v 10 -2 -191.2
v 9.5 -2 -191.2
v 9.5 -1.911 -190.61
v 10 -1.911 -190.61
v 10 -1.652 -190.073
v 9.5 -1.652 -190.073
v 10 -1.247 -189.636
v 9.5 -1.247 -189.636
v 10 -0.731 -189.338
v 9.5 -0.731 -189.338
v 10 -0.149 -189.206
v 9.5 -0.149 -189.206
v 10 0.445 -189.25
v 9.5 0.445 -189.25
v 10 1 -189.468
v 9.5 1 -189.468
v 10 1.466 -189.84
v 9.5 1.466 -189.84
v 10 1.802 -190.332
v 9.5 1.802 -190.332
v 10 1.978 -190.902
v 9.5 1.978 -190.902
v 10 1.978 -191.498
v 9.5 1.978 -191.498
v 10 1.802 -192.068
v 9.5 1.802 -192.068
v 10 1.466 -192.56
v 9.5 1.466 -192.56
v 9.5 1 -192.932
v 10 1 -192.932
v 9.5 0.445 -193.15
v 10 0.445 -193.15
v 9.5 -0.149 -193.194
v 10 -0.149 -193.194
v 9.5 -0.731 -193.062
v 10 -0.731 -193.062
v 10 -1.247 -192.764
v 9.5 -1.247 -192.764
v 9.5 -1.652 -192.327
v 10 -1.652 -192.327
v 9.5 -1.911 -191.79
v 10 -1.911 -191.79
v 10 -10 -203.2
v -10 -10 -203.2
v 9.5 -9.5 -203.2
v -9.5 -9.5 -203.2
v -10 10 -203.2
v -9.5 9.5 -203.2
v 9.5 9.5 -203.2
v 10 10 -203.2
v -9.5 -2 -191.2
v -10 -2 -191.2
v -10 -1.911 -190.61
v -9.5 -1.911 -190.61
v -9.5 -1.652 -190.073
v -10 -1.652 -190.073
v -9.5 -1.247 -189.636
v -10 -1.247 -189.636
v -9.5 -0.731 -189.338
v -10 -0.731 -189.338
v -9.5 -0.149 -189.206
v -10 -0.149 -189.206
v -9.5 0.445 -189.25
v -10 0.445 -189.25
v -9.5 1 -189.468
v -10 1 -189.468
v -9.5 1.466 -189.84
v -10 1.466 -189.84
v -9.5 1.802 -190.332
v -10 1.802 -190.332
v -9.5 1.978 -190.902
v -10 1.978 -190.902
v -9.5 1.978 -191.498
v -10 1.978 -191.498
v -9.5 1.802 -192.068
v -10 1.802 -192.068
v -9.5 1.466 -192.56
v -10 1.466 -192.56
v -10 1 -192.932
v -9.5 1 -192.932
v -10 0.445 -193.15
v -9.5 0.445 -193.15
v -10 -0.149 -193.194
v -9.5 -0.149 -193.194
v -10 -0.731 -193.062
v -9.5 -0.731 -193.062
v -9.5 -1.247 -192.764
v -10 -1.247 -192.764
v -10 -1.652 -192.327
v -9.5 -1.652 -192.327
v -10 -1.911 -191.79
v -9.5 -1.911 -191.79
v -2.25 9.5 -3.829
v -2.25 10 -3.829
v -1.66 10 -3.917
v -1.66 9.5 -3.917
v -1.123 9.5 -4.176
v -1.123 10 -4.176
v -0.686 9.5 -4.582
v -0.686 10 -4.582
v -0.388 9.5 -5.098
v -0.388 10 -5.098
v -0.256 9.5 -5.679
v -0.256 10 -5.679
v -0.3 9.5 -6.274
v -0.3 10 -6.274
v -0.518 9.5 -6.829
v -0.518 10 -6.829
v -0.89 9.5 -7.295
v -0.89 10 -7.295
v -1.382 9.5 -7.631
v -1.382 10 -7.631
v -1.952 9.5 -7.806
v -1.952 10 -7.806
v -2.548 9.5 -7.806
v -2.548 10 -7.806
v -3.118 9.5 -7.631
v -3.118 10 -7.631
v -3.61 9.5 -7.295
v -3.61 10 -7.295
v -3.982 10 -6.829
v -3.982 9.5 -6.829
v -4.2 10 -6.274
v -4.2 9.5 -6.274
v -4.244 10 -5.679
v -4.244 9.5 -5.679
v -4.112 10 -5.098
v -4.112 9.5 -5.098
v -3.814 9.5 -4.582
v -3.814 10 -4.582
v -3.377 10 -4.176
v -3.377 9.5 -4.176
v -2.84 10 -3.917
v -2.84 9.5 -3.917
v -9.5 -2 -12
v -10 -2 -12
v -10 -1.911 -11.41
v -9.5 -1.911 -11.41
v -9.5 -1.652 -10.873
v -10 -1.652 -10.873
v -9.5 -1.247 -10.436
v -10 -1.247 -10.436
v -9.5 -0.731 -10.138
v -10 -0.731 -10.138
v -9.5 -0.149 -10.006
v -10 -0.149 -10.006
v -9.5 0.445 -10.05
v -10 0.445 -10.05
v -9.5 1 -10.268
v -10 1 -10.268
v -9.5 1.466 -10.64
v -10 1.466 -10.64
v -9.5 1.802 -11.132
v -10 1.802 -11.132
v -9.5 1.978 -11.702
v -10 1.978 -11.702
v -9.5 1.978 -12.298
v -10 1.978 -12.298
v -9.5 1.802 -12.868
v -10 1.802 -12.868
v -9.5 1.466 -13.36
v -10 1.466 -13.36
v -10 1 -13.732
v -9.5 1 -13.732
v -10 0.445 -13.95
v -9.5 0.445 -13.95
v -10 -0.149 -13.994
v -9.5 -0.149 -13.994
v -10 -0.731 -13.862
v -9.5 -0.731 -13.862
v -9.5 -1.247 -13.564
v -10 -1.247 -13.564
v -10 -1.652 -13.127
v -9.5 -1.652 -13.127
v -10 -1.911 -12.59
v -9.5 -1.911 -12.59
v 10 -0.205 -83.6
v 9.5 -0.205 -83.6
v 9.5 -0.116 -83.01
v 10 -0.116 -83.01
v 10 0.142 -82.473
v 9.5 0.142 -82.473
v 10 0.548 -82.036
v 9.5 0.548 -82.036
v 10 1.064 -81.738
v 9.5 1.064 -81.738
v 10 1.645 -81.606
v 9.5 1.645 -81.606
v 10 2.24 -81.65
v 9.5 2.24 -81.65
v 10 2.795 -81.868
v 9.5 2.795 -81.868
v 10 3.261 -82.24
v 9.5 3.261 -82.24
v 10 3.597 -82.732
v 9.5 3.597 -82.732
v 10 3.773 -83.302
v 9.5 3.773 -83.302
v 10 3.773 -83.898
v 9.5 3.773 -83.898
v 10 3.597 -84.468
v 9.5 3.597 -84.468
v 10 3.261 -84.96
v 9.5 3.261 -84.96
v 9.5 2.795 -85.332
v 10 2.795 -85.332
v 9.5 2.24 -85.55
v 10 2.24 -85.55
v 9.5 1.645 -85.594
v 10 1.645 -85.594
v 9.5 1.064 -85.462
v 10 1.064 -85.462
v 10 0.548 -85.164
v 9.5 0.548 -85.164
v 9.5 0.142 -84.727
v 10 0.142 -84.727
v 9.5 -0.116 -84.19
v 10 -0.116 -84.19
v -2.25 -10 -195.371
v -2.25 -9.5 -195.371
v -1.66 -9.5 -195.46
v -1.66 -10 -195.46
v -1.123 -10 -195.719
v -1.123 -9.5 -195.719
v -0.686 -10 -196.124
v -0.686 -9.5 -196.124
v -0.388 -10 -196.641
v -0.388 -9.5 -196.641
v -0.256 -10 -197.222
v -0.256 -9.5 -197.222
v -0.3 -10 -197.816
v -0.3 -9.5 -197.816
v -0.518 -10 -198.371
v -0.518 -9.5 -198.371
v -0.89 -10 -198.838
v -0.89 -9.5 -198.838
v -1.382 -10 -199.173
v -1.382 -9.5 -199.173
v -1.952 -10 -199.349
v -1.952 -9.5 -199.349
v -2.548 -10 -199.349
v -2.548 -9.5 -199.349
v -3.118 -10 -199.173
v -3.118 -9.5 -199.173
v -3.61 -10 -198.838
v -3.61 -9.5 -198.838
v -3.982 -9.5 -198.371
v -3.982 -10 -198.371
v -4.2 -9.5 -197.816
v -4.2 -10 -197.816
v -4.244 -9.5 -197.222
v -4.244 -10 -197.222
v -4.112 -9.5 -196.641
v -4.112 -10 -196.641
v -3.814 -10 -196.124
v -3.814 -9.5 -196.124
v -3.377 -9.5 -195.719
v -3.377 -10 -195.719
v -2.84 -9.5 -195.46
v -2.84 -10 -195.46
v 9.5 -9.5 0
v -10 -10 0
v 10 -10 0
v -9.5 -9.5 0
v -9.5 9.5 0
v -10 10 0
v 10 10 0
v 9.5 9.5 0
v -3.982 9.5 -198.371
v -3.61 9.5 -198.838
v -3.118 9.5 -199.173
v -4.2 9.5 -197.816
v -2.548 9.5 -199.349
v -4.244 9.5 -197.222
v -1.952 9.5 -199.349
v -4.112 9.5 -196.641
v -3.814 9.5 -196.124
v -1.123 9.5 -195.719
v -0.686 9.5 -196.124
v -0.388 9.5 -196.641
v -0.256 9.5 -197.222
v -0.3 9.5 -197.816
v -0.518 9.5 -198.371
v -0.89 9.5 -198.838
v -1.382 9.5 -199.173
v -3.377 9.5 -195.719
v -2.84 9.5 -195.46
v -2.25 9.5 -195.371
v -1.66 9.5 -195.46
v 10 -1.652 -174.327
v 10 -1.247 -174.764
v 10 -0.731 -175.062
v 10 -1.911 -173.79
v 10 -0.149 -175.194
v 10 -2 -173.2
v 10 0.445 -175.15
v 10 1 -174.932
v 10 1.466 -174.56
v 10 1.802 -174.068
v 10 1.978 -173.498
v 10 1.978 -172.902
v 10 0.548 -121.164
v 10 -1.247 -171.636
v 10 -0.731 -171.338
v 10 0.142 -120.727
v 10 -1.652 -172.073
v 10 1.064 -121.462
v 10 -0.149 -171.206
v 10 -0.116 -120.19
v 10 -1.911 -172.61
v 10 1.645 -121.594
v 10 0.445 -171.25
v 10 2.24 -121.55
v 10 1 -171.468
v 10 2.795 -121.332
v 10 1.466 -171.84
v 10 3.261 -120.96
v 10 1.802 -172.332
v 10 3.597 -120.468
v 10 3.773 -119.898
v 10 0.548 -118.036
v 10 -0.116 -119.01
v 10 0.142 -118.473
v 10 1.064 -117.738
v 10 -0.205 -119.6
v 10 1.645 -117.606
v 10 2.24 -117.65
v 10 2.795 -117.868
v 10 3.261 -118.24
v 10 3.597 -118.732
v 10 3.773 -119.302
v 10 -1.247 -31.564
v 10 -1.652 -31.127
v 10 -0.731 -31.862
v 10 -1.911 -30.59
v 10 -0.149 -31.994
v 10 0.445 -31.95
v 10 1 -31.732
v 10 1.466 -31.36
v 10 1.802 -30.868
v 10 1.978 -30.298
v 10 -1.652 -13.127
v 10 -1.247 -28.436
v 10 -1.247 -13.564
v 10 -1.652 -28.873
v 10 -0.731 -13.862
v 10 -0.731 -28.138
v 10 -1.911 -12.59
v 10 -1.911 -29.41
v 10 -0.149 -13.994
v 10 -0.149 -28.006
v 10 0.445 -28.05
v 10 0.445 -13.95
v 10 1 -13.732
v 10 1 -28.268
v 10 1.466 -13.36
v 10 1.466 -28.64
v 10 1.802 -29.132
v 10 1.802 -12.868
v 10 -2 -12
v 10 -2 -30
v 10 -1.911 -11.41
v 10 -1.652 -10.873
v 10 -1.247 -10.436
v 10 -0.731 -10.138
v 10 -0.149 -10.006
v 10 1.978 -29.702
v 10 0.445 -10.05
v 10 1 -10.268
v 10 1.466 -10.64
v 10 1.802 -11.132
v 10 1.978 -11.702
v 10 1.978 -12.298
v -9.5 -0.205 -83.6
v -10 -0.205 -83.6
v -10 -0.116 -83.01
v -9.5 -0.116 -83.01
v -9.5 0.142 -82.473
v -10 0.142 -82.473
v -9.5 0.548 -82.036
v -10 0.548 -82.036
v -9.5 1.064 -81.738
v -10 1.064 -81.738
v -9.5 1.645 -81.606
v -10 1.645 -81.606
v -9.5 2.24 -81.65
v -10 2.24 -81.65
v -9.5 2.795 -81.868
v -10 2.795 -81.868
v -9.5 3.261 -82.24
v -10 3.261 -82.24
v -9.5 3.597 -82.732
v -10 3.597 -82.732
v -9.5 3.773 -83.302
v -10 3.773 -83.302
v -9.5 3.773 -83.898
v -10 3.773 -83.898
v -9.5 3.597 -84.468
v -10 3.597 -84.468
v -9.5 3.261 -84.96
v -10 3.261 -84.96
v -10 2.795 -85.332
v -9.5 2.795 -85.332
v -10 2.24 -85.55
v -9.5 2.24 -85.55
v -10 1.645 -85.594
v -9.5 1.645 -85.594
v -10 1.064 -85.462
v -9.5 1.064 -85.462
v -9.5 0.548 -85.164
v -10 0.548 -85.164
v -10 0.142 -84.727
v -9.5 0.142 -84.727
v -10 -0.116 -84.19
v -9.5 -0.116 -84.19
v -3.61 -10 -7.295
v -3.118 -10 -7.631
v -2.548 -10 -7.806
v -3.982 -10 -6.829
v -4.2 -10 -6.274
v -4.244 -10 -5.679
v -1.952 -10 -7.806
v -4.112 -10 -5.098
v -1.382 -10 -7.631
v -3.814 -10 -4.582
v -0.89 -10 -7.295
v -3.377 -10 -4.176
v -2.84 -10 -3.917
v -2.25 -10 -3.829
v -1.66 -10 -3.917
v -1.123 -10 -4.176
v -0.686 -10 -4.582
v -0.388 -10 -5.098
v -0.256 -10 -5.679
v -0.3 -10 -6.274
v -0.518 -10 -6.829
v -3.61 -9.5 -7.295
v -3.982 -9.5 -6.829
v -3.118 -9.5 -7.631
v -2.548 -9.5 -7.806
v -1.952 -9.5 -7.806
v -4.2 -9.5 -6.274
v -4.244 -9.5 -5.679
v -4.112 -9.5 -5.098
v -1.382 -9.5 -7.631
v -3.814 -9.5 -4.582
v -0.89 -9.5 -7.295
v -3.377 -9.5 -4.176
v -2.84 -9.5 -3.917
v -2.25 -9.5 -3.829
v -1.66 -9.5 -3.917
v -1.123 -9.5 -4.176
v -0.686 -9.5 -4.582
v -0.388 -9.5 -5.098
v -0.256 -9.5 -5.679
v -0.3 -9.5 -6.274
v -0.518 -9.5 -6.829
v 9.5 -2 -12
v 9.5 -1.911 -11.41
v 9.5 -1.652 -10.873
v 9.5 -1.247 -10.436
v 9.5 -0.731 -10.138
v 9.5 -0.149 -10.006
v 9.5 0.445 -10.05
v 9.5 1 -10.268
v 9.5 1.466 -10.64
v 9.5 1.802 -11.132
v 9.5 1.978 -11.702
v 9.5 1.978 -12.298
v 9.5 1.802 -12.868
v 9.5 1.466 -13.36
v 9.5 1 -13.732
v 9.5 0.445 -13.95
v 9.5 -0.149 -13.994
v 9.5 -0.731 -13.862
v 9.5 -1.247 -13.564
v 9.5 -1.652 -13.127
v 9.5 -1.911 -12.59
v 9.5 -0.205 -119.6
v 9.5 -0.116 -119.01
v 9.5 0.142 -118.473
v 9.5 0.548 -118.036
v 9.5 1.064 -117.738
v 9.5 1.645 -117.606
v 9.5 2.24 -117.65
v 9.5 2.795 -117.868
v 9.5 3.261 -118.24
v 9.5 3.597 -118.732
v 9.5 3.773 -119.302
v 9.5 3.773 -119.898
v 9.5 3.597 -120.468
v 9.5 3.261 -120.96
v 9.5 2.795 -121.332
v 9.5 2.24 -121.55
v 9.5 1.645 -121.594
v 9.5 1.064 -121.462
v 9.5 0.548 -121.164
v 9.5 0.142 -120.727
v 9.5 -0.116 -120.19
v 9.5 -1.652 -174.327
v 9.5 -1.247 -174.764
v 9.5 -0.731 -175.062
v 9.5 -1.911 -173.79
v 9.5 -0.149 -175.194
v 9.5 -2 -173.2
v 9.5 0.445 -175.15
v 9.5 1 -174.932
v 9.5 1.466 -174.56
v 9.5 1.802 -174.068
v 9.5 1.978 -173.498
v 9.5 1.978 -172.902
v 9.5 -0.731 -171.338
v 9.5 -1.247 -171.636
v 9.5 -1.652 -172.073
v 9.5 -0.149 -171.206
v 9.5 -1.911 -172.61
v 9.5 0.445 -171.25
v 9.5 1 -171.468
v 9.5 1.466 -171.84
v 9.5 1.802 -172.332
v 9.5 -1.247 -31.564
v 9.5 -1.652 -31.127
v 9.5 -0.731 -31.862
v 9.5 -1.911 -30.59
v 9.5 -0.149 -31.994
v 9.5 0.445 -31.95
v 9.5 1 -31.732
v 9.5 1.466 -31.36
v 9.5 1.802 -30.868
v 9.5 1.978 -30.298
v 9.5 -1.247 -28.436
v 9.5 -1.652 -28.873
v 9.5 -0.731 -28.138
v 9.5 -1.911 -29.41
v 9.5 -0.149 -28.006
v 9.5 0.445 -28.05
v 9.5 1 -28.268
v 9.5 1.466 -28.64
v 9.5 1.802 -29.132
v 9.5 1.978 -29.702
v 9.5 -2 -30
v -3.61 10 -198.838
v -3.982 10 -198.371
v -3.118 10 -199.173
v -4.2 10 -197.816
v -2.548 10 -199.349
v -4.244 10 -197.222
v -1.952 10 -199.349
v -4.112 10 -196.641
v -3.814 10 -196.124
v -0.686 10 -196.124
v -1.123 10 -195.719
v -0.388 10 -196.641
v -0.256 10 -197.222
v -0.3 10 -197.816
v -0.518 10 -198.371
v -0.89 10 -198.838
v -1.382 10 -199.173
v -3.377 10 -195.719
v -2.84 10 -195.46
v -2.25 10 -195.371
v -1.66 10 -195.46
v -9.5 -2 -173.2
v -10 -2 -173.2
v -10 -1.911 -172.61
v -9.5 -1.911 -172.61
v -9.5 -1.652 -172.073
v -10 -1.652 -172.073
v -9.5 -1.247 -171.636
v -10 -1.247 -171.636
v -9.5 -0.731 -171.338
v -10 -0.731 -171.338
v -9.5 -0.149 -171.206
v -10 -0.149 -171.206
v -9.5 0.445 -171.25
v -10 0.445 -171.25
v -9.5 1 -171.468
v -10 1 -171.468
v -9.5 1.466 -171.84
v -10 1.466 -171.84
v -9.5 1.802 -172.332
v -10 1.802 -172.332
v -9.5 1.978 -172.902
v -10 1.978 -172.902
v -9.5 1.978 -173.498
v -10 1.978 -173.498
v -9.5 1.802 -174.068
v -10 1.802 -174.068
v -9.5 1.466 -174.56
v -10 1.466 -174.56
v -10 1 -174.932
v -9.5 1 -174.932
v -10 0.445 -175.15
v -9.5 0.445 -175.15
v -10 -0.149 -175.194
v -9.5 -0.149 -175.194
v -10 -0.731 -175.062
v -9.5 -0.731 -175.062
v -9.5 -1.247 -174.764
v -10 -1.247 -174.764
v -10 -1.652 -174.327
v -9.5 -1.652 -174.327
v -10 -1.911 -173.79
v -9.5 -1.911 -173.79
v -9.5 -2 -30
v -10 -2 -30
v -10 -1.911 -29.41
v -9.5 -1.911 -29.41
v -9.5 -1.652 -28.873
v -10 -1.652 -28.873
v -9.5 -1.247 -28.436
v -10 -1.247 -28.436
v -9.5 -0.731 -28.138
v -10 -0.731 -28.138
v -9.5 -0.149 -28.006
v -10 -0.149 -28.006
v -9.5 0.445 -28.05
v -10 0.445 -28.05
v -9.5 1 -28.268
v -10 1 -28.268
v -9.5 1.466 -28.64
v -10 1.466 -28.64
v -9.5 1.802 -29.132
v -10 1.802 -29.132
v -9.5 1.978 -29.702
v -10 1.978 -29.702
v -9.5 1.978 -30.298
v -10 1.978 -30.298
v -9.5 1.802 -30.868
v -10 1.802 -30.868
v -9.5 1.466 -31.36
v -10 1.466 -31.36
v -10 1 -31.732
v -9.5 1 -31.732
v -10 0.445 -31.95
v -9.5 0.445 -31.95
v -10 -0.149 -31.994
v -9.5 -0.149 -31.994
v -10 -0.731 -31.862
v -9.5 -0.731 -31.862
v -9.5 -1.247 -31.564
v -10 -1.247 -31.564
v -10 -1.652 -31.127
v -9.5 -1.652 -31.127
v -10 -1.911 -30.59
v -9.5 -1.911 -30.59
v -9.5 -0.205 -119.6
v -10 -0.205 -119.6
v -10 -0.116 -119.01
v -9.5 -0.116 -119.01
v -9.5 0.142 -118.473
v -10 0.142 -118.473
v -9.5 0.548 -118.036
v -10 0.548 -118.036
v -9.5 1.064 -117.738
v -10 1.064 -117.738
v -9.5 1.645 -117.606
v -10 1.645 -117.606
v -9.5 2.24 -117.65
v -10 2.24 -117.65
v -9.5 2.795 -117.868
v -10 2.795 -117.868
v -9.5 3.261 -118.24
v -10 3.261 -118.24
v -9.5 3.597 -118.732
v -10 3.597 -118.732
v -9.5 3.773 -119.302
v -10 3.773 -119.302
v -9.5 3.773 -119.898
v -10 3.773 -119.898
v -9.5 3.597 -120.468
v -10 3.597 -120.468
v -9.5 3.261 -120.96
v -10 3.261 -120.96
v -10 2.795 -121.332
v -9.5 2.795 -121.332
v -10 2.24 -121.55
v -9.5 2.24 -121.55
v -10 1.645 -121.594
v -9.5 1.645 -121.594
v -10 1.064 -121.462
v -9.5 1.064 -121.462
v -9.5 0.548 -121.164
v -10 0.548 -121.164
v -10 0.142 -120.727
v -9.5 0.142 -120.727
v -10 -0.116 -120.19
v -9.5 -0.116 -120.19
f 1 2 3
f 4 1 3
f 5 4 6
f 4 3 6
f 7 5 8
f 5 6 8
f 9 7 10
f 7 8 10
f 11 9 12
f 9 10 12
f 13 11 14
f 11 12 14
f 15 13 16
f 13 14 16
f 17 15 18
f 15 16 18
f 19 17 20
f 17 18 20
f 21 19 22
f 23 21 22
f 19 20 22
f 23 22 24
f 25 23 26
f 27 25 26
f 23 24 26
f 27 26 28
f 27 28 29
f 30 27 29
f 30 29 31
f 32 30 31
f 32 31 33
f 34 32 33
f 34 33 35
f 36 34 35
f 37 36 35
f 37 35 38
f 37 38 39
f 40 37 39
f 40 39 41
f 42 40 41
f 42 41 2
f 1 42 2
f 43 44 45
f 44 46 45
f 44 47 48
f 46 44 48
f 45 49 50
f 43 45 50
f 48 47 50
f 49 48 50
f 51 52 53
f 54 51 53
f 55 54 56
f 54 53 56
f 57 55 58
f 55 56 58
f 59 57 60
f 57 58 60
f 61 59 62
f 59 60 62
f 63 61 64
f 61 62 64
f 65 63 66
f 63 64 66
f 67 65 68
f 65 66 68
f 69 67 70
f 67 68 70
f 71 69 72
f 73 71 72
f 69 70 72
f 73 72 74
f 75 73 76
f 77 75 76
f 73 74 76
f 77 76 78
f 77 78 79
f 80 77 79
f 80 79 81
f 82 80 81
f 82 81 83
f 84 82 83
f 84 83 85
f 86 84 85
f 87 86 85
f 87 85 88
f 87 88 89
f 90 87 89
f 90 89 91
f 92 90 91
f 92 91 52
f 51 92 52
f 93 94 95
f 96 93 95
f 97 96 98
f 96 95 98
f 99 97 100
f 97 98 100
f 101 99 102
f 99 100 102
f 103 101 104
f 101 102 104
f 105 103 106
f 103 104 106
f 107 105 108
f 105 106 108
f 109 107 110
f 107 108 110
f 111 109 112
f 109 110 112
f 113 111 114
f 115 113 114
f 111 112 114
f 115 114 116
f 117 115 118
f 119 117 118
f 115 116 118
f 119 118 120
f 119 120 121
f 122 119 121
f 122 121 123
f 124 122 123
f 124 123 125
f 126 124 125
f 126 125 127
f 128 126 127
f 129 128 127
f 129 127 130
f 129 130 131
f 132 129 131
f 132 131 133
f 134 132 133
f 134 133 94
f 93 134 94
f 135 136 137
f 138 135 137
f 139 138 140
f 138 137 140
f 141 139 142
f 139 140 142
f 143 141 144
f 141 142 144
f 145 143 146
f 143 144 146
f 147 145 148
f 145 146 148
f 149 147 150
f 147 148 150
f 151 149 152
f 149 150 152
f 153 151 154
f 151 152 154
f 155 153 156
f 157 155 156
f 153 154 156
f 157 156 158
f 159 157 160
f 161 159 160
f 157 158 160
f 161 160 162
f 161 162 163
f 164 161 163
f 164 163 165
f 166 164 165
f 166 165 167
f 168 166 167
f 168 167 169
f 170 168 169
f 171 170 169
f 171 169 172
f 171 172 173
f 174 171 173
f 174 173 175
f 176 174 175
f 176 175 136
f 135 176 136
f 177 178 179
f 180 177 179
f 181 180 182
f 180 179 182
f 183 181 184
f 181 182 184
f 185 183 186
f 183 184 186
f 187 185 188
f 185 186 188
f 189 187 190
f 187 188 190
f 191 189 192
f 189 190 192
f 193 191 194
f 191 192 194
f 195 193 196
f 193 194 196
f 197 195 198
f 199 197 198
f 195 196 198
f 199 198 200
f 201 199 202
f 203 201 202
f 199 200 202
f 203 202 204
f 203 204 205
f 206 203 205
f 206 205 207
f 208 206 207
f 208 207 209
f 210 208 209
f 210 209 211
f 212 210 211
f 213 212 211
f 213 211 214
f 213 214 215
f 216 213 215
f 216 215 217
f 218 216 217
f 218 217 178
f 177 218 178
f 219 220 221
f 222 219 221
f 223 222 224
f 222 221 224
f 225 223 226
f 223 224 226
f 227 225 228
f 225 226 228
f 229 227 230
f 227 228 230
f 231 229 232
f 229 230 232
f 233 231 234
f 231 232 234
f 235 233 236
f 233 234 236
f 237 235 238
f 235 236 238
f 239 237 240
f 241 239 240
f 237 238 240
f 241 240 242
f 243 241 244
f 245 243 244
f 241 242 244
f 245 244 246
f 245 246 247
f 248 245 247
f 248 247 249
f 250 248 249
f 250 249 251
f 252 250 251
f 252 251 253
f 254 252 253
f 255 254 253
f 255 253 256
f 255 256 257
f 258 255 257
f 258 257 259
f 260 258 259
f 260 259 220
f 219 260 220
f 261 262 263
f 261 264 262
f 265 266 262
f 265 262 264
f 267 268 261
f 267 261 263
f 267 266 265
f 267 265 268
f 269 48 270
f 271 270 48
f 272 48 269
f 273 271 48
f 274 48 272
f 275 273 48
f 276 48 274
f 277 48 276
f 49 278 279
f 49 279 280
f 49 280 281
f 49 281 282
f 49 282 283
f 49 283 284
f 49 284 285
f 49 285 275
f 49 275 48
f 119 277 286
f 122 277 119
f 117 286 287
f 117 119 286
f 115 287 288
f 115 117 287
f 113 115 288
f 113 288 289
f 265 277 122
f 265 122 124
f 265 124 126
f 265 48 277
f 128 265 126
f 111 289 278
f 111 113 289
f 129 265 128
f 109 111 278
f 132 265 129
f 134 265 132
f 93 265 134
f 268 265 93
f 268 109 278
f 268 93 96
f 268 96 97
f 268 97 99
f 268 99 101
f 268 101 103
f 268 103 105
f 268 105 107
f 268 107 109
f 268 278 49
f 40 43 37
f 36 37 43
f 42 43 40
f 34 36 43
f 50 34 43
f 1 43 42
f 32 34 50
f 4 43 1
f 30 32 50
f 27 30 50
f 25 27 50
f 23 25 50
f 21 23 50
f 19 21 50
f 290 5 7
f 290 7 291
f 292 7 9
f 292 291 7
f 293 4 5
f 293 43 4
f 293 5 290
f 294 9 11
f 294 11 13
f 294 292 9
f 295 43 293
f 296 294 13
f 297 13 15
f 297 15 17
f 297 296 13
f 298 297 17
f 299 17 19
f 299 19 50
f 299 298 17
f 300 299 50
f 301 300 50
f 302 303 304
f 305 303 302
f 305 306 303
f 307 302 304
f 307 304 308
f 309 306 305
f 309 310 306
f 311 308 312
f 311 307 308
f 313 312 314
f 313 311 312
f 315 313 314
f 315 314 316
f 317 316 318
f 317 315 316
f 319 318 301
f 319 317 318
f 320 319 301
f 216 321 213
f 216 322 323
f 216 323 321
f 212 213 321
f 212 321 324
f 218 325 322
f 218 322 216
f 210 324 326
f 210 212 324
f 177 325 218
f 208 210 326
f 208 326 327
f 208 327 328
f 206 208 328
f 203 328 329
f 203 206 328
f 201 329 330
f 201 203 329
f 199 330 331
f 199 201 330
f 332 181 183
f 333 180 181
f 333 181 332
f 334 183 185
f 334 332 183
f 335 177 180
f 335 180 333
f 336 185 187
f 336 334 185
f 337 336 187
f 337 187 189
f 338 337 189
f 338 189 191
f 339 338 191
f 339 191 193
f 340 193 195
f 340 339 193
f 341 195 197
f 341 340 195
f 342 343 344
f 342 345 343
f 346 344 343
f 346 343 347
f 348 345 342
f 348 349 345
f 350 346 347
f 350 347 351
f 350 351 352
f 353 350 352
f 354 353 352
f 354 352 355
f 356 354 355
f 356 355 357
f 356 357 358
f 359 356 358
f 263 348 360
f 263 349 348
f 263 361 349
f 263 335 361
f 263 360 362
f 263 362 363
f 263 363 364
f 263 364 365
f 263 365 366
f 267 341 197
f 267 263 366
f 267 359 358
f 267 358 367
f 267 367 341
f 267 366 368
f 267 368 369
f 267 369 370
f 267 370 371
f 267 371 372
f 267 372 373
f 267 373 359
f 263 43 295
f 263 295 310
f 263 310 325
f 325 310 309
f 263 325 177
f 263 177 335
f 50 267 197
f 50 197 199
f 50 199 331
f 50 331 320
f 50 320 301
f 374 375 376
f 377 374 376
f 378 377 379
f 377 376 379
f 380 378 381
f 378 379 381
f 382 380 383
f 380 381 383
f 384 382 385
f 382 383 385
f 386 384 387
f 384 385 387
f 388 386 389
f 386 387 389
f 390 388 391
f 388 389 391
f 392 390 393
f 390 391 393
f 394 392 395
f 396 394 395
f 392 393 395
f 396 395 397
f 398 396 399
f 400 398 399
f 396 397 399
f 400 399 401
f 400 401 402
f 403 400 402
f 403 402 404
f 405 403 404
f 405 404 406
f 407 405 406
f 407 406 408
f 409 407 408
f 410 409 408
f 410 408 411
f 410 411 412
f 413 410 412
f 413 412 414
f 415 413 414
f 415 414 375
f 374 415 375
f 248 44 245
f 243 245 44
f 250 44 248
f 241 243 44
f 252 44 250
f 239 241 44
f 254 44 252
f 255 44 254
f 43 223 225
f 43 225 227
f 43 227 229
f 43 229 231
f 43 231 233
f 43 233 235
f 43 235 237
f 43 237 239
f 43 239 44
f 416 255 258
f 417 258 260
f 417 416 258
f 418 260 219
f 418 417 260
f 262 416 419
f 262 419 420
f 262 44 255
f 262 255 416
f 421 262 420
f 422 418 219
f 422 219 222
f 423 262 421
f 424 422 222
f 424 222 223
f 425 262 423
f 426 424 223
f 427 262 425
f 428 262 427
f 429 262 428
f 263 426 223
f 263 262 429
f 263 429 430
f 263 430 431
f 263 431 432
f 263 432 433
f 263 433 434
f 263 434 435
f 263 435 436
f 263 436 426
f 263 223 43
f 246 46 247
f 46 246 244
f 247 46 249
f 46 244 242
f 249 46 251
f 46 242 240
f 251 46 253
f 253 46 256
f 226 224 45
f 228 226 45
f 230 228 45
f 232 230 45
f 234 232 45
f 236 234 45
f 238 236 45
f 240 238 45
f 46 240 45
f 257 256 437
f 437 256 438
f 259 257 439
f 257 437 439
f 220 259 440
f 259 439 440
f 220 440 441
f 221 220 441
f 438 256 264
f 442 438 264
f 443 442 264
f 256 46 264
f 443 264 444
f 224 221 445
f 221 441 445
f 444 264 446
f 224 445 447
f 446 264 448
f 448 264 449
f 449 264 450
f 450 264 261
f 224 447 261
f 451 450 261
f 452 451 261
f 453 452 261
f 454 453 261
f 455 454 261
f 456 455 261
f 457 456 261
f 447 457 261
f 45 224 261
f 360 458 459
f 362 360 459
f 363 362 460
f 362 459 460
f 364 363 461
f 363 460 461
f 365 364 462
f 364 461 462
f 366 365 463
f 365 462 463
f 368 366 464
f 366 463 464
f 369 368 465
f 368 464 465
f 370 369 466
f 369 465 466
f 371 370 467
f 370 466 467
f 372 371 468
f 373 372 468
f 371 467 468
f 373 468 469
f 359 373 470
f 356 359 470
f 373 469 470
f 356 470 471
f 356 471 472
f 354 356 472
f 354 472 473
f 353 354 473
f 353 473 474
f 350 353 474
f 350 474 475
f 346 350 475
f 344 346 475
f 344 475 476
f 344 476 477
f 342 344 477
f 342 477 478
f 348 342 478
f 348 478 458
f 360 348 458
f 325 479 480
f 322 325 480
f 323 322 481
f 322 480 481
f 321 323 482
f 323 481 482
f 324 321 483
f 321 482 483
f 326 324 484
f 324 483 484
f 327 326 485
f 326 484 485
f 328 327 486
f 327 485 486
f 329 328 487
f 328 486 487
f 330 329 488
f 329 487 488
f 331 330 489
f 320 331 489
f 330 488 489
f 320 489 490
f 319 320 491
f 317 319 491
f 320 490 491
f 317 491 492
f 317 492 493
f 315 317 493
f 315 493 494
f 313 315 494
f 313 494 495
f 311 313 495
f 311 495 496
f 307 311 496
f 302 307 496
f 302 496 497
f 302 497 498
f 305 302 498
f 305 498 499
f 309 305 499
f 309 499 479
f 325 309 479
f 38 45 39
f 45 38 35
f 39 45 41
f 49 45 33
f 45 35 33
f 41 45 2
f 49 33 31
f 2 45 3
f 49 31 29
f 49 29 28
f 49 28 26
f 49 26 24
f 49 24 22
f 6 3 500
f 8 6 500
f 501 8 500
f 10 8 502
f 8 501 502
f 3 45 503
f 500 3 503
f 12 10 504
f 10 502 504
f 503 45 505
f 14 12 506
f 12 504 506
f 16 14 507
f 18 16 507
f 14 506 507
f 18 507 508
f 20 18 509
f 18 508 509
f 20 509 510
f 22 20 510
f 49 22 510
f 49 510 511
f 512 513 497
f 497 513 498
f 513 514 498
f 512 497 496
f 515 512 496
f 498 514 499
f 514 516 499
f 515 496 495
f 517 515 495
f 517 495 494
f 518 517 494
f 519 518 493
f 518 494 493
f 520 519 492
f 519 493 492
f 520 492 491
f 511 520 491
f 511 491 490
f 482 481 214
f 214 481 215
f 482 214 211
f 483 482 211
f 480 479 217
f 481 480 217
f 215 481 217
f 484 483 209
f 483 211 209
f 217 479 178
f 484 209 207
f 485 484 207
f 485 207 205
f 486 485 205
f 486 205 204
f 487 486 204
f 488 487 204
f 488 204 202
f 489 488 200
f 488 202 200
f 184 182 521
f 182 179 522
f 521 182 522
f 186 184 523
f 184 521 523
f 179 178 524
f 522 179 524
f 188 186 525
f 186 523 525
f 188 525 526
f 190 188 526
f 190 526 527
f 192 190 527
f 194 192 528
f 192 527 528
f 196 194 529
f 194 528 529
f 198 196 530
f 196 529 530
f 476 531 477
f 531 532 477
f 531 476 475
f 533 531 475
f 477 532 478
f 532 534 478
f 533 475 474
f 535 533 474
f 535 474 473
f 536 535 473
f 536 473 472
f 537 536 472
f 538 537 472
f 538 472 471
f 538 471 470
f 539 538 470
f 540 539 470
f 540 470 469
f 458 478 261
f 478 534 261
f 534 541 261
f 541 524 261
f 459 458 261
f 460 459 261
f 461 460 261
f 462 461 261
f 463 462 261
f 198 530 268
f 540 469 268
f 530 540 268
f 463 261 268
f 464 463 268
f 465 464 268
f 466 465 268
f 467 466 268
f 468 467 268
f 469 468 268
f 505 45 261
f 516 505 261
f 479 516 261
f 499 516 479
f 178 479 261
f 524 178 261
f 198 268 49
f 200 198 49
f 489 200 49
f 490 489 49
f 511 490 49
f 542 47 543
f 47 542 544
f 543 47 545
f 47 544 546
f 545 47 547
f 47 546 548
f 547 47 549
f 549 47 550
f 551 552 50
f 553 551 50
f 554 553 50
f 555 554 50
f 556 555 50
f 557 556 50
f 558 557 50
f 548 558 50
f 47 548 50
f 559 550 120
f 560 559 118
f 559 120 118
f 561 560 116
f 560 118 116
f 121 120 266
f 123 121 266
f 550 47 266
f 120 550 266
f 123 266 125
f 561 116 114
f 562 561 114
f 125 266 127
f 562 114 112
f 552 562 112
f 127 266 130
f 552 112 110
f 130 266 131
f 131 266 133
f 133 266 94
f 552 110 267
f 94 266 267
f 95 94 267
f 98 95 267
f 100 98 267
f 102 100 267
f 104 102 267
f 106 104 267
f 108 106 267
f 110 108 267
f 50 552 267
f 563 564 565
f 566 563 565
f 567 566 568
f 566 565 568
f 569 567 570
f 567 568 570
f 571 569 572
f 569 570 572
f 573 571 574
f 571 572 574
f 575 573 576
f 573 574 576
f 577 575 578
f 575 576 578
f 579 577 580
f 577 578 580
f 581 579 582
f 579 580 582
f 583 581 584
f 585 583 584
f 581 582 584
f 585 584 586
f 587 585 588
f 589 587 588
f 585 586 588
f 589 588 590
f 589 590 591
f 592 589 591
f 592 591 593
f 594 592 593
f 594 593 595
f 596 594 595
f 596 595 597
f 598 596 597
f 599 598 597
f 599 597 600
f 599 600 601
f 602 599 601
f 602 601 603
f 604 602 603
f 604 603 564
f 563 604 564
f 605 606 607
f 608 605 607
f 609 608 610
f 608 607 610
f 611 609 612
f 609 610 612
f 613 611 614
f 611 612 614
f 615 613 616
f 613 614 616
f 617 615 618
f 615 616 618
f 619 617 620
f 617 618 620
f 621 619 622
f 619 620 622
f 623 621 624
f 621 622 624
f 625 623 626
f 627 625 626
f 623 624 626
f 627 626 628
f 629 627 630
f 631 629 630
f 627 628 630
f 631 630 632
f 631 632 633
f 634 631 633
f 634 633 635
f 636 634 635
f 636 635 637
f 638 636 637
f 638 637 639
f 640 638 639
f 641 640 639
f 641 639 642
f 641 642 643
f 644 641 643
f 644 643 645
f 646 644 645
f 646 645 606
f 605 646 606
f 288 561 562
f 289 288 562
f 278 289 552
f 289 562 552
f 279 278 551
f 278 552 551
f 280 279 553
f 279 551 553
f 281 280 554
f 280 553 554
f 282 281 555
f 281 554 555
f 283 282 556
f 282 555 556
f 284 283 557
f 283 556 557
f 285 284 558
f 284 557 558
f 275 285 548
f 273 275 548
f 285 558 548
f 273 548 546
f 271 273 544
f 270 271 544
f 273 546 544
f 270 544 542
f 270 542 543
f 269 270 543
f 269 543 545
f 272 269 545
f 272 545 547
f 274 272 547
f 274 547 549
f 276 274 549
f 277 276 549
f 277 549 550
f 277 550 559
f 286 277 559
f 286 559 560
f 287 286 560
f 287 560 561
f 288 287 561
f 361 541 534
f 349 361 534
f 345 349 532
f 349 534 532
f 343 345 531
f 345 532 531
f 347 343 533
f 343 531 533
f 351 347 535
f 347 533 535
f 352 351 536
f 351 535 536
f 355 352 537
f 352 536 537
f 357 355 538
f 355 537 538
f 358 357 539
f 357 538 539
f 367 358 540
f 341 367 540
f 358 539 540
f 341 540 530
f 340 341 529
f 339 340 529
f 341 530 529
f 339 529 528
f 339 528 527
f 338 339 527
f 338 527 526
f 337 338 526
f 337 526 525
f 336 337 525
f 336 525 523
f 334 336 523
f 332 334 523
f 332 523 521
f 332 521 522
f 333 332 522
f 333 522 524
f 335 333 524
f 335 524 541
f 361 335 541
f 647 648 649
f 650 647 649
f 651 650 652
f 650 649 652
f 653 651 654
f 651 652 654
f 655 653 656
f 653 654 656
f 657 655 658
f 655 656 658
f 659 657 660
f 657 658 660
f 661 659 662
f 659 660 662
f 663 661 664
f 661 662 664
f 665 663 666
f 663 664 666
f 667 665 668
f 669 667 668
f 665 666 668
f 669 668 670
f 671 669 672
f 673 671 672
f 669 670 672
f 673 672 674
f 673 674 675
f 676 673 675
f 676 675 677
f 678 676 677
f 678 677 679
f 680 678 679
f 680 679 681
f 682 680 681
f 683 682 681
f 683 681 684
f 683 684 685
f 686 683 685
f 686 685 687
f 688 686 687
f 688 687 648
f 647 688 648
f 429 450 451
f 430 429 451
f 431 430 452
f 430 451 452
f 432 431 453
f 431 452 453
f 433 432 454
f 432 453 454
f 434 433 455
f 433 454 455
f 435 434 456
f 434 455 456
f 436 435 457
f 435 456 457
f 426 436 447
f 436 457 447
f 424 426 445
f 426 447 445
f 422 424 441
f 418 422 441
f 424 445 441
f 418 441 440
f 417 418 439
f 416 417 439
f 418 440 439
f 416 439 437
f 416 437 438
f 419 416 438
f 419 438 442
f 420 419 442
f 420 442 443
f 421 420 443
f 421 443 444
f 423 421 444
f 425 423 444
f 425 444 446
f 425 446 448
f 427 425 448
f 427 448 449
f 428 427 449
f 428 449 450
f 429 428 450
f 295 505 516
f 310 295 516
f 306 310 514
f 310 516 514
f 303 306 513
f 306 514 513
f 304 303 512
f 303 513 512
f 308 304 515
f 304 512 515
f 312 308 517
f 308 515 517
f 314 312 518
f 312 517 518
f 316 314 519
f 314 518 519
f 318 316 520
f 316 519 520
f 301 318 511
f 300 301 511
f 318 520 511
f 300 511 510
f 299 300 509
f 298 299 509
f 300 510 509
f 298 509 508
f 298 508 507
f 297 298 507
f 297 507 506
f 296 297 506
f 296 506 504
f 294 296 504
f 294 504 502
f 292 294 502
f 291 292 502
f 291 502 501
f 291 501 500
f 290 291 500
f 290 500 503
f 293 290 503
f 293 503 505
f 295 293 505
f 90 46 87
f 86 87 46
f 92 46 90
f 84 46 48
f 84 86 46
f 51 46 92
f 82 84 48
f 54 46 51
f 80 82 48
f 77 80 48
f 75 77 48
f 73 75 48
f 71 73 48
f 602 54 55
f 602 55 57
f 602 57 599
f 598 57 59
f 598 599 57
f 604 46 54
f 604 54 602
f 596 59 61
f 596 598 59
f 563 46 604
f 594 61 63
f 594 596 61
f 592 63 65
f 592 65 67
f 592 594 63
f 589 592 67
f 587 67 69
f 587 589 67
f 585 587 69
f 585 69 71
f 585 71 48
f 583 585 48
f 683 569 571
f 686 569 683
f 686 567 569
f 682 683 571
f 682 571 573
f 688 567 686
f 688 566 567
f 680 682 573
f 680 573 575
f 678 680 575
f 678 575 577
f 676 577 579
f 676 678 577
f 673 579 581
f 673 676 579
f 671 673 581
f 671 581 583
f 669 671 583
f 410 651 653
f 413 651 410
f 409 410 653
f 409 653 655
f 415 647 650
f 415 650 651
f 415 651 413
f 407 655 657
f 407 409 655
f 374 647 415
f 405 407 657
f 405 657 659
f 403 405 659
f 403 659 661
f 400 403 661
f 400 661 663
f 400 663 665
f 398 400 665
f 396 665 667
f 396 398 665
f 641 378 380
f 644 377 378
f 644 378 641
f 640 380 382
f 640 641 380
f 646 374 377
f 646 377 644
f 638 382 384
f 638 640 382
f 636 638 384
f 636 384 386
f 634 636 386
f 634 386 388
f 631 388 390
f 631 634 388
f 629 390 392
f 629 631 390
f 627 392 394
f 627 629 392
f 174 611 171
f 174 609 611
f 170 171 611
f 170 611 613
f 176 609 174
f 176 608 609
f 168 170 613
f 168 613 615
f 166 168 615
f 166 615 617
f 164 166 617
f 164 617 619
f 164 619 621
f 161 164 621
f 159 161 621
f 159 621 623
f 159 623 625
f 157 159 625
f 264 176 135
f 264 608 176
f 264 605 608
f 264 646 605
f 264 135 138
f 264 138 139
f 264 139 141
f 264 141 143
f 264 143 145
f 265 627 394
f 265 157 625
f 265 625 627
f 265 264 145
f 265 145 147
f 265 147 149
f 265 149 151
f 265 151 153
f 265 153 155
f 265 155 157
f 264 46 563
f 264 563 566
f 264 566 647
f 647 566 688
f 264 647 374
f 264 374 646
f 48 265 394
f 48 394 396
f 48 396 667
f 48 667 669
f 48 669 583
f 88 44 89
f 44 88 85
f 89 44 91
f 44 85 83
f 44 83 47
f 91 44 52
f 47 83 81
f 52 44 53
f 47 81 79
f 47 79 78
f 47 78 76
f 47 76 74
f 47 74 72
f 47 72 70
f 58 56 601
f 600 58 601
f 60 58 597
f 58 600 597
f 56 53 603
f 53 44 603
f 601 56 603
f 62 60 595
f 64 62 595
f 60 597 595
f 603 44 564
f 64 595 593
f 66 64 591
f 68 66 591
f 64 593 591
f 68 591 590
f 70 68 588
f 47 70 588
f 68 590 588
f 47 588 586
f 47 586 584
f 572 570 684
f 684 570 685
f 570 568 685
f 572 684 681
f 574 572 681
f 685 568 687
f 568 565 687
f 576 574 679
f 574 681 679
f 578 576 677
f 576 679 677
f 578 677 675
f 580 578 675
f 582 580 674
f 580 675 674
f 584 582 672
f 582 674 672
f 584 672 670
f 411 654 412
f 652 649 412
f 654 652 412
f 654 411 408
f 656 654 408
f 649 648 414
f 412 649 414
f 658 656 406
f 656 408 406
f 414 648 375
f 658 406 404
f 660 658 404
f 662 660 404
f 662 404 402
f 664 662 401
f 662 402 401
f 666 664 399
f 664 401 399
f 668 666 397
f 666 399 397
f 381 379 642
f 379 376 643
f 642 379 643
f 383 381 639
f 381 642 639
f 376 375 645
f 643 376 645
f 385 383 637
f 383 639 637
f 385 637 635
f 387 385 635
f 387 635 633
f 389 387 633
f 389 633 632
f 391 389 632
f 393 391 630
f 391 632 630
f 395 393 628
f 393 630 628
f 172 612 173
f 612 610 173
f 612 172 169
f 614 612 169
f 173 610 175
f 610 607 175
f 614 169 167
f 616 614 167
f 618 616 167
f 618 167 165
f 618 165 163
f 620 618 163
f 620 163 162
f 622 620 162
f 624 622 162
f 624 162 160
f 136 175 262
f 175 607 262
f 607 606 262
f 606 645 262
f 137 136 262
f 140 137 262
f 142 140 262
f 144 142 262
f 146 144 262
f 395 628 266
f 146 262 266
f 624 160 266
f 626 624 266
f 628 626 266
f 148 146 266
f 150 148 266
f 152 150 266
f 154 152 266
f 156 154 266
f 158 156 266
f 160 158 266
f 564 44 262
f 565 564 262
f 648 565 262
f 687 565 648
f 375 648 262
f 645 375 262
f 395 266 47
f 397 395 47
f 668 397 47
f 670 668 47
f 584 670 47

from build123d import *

# Parameters (mm, degrees)
SKETCH_1_W          = 20
SKETCH_1_H          = 20
SKETCH_1_W_2        = 19
SKETCH_1_H_2        = 19
EXTRUDE_1_DEPTH     = 203.2
SKETCH_2_R          = 2
CUT_EXTRUDE_1_DEPTH = 205.426612749
SKETCH_3_R          = 2
CUT_EXTRUDE_2_DEPTH = 205.426612749


with BuildPart() as part:
    # 草图1 → 凸台-拉伸1 (new body)
    with BuildSketch(Plane.XY):
        Rectangle(SKETCH_1_W, SKETCH_1_H)
        Rectangle(SKETCH_1_W_2, SKETCH_1_H_2, mode=Mode.SUBTRACT)
    extrude(amount=-EXTRUDE_1_DEPTH)

    # 草图2 → 切除-拉伸1 (cut, through all)
    with BuildSketch(Plane.ZY.offset(10)):
        with Locations(Location((-30, 0, 0), (0, 0, 270))):
            Circle(SKETCH_2_R)
        with Locations(Location((-83.6, 1.794910396, 0), (0, 0, 270))):
            Circle(SKETCH_2_R)
        with Locations(Location((-119.6, 1.794910396, 0), (0, 0, 270))):
            Circle(SKETCH_2_R)
        with Locations(Location((-173.2, 0, 0), (0, 0, 270))):
            Circle(SKETCH_2_R)
        with Locations(Location((-191.2, 0, 0), (0, 0, 270))):
            Circle(SKETCH_2_R)
        with Locations(Location((-12, 0, 0), (0, 0, 270))):
            Circle(SKETCH_2_R)
    extrude(amount=-CUT_EXTRUDE_1_DEPTH, mode=Mode.SUBTRACT)

    # 草图3 → 切除-拉伸2 (cut, through all)
    with BuildSketch(Plane(origin=(0, 10, 0), x_dir=(1, 0, 0), z_dir=(0, 1, 0))):
        with Locations(Location((-2.25, 197.371407716, 0), (0, 0, 270))):
            Circle(SKETCH_3_R)
        with Locations(Location((-2.25, 5.828592284, 0), (0, 0, 270))):
            Circle(SKETCH_3_R)
    extrude(amount=-CUT_EXTRUDE_2_DEPTH, mode=Mode.SUBTRACT)


solid = part.part
